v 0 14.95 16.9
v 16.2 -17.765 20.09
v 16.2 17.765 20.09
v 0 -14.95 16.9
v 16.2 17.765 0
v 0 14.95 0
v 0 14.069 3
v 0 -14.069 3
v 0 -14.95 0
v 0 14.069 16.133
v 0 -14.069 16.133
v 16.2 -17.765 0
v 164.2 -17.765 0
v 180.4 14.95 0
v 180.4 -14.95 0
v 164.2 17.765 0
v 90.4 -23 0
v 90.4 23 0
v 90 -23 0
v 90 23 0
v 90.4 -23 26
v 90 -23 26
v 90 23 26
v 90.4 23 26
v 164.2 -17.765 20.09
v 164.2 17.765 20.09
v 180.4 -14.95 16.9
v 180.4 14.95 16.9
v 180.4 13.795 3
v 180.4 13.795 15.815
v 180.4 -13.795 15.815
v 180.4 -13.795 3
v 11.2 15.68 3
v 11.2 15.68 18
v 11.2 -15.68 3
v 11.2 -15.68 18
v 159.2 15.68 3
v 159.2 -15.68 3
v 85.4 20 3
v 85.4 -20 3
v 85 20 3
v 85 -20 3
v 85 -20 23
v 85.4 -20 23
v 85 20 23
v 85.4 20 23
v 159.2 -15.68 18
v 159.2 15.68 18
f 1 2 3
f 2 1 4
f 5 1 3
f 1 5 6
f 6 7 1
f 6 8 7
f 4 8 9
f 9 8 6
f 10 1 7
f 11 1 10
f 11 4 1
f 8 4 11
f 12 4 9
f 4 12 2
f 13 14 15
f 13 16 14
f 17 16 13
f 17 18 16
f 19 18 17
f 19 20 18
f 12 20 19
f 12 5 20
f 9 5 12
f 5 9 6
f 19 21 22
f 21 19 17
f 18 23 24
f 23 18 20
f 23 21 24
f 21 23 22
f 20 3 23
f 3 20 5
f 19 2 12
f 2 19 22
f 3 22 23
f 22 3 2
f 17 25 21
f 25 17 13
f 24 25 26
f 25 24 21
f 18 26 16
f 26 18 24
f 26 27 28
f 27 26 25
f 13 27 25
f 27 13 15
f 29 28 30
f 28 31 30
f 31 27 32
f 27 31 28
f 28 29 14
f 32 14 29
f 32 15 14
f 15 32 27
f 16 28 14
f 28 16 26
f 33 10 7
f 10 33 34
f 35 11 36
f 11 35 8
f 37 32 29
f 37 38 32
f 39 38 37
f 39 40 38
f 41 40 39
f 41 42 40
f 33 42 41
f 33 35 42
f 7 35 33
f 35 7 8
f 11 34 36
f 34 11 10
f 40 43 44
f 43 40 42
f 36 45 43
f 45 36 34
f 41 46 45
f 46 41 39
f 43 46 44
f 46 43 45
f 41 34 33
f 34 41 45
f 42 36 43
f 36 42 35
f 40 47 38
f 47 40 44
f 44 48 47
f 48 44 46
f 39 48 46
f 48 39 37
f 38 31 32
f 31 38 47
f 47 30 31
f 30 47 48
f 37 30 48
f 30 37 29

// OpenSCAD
$fn = 32;

// ----------------------------------------------------------------------
// Faired channel: 180 x 46 x 26 mm, 3 mm walls, faired ends
// ----------------------------------------------------------------------

// --- parameters (mm) ---
length = 180;             // channel length
width = 46;               // channel width at mid length
height = 26;              // channel height at mid length
wall = 3;                 // side wall thickness
floor_t = 3;              // floor thickness
end_w = 29.9;             // faired end width
end_h = 16.9;             // faired end height

difference() {
  union() {
    hull() {
      translate([0, -14.95, 0]) cube([0.4, 29.9, 16.9]);
      translate([16.2, -17.765, 0]) cube([0.4, 35.53, 20.09]);
    }
    hull() {
      translate([16.2, -17.765, 0]) cube([0.4, 35.53, 20.09]);
      translate([90, -23, 0]) cube([0.4, 46, 26]);
    }
    hull() {
      translate([90, -23, 0]) cube([0.4, 46, 26]);
      translate([163.8, -17.765, 0]) cube([0.4, 35.53, 20.09]);
    }
    hull() {
      translate([163.8, -17.765, 0]) cube([0.4, 35.53, 20.09]);
      translate([180, -14.95, 0]) cube([0.4, 29.9, 16.9]);
    }
  }
  /* cavity, 5 mm proud of both ends so the ports are cut clean */
  hull() {
    translate([-5, -13.35, 3]) cube([0.4, 26.7, 12.3]);
    translate([11.2, -15.68, 3]) cube([0.4, 31.36, 15]);
  }
  hull() {
    translate([11.2, -15.68, 3]) cube([0.4, 31.36, 15]);
    translate([85, -20, 3]) cube([0.4, 40, 20]);
  }
  hull() {
    translate([85, -20, 3]) cube([0.4, 40, 20]);
    translate([158.8, -15.68, 3]) cube([0.4, 31.36, 15]);
  }
  hull() {
    translate([158.8, -15.68, 3]) cube([0.4, 31.36, 15]);
    translate([185, -13.35, 3]) cube([0.4, 26.7, 12.3]);
  }
}
